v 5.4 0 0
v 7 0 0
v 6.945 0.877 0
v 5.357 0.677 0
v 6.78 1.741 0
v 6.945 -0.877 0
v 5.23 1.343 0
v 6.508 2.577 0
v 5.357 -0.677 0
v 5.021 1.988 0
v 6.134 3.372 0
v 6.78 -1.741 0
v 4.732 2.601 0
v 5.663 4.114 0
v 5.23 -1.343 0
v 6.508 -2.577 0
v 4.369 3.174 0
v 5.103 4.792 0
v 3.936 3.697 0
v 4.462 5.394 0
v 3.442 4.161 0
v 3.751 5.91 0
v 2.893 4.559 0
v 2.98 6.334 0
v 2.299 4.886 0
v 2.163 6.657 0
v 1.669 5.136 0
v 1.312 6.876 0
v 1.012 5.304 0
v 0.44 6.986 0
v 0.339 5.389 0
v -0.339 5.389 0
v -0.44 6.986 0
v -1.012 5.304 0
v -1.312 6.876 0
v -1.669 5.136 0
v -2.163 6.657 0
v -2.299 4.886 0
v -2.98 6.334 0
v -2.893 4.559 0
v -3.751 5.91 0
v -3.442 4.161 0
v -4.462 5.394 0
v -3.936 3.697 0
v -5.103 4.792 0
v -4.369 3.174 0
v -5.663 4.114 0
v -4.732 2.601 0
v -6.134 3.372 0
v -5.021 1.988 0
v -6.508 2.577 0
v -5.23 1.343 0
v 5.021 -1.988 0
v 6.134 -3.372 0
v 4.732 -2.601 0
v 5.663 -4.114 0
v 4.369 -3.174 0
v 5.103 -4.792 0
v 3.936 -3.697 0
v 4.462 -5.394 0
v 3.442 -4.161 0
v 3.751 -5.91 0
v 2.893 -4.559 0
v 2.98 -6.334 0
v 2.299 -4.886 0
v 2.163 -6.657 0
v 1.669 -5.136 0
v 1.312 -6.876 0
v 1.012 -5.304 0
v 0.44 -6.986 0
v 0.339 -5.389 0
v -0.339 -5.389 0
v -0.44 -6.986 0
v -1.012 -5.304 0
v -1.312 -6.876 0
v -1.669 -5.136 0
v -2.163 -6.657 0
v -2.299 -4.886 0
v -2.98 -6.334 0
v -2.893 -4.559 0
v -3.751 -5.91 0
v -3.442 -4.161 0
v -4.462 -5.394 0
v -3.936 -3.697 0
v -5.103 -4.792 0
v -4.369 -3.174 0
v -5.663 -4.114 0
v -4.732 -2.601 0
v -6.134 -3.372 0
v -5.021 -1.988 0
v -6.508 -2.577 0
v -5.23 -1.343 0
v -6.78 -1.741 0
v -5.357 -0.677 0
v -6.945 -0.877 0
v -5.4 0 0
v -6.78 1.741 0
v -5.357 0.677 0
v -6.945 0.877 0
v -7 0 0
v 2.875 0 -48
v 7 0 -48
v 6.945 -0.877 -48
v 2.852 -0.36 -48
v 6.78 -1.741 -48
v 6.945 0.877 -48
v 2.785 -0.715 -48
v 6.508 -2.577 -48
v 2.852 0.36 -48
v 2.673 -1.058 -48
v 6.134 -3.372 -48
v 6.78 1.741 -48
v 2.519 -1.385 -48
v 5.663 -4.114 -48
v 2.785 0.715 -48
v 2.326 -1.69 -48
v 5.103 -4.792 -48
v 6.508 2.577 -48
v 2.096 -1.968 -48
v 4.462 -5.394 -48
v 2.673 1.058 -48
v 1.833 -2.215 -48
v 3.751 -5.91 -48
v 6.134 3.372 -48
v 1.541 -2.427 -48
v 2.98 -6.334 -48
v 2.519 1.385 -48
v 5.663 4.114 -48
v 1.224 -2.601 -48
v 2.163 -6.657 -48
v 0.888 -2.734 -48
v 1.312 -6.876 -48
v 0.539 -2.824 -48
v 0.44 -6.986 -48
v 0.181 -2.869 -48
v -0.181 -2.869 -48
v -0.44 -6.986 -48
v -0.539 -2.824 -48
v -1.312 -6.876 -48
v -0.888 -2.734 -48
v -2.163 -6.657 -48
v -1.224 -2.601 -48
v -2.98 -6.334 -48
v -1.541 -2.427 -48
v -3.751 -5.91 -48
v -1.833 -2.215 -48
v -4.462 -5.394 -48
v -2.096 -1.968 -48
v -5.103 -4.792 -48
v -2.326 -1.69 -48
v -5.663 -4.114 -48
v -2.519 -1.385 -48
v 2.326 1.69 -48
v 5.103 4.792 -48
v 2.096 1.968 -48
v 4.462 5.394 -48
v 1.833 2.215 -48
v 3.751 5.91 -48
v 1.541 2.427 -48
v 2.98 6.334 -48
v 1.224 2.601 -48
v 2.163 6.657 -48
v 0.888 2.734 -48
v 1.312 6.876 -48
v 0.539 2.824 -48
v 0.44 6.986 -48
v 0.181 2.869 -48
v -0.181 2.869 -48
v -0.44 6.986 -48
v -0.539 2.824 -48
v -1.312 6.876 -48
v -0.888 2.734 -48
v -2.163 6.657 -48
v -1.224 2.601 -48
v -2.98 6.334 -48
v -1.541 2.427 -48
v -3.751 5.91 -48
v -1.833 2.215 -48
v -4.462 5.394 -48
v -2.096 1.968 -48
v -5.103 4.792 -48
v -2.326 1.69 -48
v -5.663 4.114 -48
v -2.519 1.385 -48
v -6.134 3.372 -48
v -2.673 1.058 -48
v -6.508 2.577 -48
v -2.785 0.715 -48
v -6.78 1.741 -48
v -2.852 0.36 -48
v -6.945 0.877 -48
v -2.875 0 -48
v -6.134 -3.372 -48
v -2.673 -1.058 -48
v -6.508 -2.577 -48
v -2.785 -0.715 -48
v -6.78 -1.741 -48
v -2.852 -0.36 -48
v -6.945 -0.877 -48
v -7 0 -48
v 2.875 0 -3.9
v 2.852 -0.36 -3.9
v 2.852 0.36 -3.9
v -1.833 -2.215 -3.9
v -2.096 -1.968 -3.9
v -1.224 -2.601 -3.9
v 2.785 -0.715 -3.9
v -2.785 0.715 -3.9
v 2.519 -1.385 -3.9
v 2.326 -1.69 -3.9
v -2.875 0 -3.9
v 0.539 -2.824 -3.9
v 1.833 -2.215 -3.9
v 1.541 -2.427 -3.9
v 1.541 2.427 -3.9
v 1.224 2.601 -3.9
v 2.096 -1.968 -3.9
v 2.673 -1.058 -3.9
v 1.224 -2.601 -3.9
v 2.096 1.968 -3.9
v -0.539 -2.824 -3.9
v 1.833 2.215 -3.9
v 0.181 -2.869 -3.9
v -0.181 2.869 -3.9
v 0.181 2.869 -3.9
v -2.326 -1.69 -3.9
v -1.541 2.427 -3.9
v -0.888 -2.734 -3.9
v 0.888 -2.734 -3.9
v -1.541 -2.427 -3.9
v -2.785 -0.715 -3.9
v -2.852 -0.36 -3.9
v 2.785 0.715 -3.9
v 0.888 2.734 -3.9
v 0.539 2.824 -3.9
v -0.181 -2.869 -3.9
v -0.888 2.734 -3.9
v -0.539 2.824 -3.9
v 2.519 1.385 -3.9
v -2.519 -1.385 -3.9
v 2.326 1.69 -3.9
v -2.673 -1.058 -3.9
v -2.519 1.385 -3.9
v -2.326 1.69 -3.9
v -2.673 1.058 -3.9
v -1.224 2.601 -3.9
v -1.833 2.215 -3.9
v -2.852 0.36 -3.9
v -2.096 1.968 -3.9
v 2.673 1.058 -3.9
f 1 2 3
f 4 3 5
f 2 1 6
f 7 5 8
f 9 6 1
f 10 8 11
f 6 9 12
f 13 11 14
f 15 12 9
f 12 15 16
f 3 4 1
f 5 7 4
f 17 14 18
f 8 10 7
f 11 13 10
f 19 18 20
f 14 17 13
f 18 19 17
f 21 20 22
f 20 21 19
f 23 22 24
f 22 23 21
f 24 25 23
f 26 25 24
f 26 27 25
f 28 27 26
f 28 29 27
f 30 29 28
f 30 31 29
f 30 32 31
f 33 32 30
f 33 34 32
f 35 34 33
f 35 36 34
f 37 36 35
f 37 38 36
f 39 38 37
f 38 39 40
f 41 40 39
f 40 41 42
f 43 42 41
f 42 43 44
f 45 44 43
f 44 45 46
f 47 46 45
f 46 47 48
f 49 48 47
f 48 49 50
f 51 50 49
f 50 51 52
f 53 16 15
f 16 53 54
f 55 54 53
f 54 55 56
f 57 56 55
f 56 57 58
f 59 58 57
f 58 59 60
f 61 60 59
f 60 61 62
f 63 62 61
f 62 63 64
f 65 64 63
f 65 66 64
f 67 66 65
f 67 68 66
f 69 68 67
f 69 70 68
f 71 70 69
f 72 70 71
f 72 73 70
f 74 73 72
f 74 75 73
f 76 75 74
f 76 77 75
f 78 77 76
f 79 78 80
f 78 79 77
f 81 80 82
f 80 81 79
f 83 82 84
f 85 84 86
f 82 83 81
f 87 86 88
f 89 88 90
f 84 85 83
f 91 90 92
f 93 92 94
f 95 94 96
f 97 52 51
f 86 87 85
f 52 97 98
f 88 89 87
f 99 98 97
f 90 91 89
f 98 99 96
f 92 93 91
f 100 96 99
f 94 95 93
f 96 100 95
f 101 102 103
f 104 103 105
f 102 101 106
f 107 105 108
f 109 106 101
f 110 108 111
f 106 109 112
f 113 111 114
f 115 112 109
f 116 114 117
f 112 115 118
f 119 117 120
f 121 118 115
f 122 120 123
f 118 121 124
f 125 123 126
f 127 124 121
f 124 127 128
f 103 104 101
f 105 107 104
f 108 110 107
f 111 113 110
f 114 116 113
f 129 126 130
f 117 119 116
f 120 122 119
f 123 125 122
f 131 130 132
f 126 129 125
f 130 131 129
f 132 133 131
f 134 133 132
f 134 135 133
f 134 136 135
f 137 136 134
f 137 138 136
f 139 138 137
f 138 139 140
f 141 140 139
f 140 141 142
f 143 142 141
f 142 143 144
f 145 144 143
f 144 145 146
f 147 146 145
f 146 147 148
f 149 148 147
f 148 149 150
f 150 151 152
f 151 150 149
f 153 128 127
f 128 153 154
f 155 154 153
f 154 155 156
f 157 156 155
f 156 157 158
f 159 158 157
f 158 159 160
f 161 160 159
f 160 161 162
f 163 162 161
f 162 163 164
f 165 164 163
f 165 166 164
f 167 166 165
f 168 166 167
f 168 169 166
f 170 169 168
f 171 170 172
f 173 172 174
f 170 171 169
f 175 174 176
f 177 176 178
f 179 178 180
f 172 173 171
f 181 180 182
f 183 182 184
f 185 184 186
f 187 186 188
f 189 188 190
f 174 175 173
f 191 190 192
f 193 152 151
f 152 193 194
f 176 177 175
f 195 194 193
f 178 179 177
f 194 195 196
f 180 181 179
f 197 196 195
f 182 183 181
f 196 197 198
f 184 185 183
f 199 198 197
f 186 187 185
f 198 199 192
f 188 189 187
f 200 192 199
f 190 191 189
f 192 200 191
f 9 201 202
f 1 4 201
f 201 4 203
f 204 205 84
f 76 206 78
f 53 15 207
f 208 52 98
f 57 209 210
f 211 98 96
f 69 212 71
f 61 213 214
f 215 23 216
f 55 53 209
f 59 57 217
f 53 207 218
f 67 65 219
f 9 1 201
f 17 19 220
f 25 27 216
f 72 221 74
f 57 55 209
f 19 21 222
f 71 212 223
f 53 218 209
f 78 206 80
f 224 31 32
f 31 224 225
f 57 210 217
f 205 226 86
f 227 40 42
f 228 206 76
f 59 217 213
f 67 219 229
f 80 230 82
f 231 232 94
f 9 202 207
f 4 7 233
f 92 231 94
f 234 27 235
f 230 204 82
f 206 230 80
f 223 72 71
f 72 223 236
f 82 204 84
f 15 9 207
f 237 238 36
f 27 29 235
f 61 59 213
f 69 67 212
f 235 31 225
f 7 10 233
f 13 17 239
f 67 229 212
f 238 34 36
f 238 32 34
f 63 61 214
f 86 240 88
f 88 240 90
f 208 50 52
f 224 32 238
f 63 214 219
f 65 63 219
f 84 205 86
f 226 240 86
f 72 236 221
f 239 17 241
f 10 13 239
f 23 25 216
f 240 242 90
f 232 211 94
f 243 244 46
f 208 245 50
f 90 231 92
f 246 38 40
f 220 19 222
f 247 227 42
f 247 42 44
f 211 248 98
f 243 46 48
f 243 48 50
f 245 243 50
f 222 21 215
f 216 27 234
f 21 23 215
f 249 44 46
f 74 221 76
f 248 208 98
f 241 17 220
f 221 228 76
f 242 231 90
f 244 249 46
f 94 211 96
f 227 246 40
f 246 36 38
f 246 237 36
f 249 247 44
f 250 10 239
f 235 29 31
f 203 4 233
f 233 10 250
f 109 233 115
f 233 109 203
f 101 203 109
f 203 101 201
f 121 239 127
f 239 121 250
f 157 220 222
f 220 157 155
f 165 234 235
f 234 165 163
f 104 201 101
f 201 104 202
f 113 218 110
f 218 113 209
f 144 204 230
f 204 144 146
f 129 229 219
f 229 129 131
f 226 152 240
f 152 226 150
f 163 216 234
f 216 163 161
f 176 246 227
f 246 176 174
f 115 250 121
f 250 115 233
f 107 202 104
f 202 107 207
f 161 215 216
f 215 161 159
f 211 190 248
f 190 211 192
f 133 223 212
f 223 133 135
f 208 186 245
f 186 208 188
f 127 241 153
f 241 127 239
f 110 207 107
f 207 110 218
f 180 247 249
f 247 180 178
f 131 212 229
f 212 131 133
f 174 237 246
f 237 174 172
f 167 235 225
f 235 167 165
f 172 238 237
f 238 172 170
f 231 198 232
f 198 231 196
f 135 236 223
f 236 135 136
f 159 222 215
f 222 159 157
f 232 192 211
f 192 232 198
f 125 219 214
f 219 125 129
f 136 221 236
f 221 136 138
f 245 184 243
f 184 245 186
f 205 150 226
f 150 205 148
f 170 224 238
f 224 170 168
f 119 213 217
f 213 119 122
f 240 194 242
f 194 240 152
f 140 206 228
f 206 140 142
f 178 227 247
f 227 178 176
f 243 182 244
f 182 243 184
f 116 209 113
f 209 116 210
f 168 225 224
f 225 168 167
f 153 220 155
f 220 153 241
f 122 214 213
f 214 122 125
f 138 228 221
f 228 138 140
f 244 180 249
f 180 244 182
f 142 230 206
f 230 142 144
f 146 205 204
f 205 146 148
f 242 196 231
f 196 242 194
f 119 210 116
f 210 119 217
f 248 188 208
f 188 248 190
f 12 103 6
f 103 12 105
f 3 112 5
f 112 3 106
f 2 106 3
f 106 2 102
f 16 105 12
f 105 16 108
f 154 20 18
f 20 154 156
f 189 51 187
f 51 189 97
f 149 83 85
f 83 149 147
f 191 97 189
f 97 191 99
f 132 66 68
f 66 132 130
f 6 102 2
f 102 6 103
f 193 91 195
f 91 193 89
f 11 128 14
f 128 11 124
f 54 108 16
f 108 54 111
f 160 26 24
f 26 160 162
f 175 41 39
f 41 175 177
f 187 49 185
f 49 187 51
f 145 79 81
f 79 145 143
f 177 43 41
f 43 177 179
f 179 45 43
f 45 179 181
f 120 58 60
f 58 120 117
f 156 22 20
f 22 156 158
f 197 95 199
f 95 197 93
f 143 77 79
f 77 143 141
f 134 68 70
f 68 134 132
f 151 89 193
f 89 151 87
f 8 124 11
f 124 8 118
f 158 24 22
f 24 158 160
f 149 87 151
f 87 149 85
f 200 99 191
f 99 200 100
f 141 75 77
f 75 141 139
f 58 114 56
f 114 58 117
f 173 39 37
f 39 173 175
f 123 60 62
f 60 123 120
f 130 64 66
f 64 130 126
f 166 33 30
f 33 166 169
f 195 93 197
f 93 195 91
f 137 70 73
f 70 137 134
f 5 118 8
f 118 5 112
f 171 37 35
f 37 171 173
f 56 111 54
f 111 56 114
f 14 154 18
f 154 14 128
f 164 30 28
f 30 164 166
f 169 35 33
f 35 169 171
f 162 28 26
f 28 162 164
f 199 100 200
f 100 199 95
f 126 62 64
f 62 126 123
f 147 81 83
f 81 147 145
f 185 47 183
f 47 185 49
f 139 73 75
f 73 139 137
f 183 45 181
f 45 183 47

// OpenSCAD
$fn = 50;


difference() {
	union() {
		translate(v = [0, 0, -48.0000000000]) {
			cylinder(h = 48, r = 7.0000000000);
		}
	}
	union() {
		translate(v = [0, 0, 0]) {
			rotate(a = [0, 0, 0]) {
				difference() {
					union() {
						#translate(v = [0, 0, -48.0000000000]) {
							cylinder(h = 48, r = 2.6000000000);
						}
						#translate(v = [0, 0, -3.9000000000]) {
							cylinder(h = 3.9000000000, r1 = 2.8750000000, r2 = 5.4000000000);
						}
						#translate(v = [0, 0, -48.0000000000]) {
							cylinder(h = 48, r = 2.8750000000);
						}
						#translate(v = [0, 0, -48.0000000000]) {
							cylinder(h = 48, r = 2.6000000000);
						}
					}
					union();
				}
			}
		}
	}
}
